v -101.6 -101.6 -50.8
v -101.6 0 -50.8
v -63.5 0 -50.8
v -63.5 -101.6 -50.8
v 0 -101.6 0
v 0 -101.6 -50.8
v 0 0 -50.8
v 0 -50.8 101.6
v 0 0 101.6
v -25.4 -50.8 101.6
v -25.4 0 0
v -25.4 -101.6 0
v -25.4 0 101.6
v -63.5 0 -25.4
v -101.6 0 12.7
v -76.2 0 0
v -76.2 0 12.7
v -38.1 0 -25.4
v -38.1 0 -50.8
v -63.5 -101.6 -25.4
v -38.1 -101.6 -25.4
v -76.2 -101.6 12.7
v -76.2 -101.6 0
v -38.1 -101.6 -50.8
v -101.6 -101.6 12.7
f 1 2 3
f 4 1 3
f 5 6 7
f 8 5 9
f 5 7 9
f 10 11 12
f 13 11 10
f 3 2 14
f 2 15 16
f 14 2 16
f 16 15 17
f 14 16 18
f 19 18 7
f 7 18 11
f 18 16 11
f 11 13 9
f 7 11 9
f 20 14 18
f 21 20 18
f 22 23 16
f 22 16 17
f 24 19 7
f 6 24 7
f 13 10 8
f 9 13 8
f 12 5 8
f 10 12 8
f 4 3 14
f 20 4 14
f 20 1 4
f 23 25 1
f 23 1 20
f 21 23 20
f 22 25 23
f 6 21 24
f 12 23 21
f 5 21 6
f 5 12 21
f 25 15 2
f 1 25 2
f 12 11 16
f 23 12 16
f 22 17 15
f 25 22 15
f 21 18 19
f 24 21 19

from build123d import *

# Parameters (mm, degrees)
F0_W     = 25.4
F0_H     = 101.6
F1_DEPTH = 101.6
F3_DEPTH = 25.4


with BuildPart() as f1:
    # F0 (on Front) → F1 (new body)
    with BuildSketch(Plane.XZ):
        Polygon((0, -50.8), (0, 0), (-25.4, 0), (-76.2, 0), (-76.2, 12.7), (-101.6, 12.7), (-101.6, -50.8), (-63.5, -50.8), (-63.5, -25.4), (-38.1, -25.4), (-38.1, -50.8), align=None)
        with Locations((-12.7, 50.8)):
            Rectangle(F0_W, F0_H)
    extrude(amount=F1_DEPTH)

    # F2 (on face) → F3 (cut)
    with BuildSketch(Plane.YZ):
        Polygon((-101.6, 0), (-50.8, 101.6), (-101.6, 101.6), align=None)
    extrude(amount=-F3_DEPTH, mode=Mode.SUBTRACT)


solid = f1.part
